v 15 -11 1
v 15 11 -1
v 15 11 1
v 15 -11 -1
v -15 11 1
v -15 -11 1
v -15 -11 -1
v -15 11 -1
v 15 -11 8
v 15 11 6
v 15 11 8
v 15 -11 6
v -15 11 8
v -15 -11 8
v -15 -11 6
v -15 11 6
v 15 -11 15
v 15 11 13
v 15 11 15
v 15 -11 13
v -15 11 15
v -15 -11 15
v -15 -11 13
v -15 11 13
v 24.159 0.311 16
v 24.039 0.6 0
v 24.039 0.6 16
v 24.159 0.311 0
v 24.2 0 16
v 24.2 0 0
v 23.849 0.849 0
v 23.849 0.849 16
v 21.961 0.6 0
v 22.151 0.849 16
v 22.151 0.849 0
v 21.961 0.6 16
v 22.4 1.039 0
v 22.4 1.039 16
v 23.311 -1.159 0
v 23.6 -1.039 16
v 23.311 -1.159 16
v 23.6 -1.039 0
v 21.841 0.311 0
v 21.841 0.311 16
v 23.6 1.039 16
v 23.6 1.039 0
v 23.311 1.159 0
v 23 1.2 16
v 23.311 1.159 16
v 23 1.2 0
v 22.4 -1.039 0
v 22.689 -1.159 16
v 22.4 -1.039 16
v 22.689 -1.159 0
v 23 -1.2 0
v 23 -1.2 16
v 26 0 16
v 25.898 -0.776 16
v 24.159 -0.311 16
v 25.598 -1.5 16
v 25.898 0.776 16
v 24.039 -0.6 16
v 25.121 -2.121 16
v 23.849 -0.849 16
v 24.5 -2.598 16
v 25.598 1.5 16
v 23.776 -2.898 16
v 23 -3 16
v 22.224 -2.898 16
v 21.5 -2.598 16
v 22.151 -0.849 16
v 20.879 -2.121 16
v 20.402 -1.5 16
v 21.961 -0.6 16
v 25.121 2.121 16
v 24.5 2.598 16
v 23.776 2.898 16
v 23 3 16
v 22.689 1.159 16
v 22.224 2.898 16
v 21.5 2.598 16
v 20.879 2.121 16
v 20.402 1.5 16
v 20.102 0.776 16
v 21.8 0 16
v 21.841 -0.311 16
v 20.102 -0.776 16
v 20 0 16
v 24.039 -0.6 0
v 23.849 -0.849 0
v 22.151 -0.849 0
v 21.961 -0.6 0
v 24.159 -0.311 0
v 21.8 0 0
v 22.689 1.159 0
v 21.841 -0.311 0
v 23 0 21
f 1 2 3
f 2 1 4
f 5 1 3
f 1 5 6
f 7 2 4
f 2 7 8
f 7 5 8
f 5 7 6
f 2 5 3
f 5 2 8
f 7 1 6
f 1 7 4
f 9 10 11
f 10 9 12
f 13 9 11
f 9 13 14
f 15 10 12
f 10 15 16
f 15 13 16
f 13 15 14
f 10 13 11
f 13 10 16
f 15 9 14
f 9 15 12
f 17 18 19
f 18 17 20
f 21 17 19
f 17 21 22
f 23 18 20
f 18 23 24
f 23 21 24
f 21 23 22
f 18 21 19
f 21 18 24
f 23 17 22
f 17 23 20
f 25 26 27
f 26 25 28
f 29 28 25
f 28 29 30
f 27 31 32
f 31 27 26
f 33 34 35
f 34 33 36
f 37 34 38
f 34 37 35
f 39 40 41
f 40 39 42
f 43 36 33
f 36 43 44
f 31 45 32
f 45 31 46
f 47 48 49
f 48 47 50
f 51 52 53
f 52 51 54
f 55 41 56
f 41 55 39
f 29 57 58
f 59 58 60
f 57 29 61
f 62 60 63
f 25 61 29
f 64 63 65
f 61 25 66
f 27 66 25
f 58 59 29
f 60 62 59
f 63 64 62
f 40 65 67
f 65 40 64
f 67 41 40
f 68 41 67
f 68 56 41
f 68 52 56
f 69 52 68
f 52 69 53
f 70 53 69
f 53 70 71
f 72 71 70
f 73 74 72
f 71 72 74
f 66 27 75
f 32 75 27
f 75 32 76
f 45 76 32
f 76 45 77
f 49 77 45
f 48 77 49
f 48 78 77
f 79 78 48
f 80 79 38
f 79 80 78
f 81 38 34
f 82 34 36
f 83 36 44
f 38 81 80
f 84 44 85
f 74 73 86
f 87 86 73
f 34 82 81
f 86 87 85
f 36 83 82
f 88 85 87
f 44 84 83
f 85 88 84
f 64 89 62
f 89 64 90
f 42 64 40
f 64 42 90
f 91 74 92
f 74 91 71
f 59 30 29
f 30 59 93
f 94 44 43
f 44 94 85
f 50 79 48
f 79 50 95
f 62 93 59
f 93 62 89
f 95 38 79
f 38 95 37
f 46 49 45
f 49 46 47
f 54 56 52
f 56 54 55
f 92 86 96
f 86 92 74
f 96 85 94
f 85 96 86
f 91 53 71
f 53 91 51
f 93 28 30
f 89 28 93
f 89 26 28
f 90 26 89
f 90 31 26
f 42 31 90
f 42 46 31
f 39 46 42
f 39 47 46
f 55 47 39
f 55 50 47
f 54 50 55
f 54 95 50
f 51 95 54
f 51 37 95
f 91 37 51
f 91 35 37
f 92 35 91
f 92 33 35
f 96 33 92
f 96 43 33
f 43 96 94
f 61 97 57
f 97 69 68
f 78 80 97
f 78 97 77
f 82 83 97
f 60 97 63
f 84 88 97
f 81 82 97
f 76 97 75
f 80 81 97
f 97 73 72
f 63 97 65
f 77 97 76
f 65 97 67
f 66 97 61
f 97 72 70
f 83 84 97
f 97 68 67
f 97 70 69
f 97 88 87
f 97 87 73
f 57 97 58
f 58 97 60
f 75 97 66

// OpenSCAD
// Editable conceptual layers. Set flat=true for a vector top projection.
flat = false;
$fn = 24;
module scene() {
    for (z=[0:2]) color([.08+.08*z, .45+.12*z, .65])
        translate([0,0,z*7]) cube([30,22,2],center=true);
    translate([23,0,0]) {
        cylinder(h=16,r=1.2);
        translate([0,0,16]) cylinder(h=5,r1=3,r2=0);
    }
}
if (flat) projection(cut=false) scene(); else scene();
